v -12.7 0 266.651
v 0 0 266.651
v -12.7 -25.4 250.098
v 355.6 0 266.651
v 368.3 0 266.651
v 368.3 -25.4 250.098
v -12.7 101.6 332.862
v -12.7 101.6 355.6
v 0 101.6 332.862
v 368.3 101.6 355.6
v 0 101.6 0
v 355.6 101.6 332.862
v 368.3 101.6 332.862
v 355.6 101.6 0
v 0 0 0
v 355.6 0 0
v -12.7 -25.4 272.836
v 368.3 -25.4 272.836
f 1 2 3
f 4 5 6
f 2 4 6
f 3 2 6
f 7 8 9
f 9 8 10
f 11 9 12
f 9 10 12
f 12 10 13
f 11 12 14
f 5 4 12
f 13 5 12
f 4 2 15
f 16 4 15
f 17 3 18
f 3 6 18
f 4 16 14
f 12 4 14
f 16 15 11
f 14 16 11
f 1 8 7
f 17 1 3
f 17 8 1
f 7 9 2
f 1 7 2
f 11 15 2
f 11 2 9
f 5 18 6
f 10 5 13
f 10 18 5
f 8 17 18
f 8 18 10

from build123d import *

# Parameters (mm, degrees)
F1_DEPTH = 355.6
F3_DEPTH = 12.7
F5_DEPTH = 12.7


with BuildPart() as f1:
    # F0 (on Right) → F1 (new body)
    with BuildSketch(Plane.YZ):
        Polygon((0, 266.650707), (0, 0), (101.6, 0), (101.6, 355.6), (-25.4, 272.836097), (-25.4, 250.097926), align=None)
    extrude(amount=F1_DEPTH)

    # F2 (on face) → F3 (join)
    with BuildSketch(Plane.YZ.offset(355.6)):
        Polygon((-25.4, 250.097926), (0, 266.650707), (101.6, 332.861829), (101.6, 355.6), (-25.4, 272.836097), align=None)
    extrude(amount=F3_DEPTH)

    # F4 (on face) → F5 (join)
    with BuildSketch(Plane(origin=(0, 0, 0), x_dir=(0, -1, 0), z_dir=(-1, 0, 0))):
        Polygon((-101.6, 332.861829), (0, 266.650707), (25.4, 250.097926), (25.4, 272.836097), (-101.6, 355.6), align=None)
    extrude(amount=F5_DEPTH)


solid = f1.part
